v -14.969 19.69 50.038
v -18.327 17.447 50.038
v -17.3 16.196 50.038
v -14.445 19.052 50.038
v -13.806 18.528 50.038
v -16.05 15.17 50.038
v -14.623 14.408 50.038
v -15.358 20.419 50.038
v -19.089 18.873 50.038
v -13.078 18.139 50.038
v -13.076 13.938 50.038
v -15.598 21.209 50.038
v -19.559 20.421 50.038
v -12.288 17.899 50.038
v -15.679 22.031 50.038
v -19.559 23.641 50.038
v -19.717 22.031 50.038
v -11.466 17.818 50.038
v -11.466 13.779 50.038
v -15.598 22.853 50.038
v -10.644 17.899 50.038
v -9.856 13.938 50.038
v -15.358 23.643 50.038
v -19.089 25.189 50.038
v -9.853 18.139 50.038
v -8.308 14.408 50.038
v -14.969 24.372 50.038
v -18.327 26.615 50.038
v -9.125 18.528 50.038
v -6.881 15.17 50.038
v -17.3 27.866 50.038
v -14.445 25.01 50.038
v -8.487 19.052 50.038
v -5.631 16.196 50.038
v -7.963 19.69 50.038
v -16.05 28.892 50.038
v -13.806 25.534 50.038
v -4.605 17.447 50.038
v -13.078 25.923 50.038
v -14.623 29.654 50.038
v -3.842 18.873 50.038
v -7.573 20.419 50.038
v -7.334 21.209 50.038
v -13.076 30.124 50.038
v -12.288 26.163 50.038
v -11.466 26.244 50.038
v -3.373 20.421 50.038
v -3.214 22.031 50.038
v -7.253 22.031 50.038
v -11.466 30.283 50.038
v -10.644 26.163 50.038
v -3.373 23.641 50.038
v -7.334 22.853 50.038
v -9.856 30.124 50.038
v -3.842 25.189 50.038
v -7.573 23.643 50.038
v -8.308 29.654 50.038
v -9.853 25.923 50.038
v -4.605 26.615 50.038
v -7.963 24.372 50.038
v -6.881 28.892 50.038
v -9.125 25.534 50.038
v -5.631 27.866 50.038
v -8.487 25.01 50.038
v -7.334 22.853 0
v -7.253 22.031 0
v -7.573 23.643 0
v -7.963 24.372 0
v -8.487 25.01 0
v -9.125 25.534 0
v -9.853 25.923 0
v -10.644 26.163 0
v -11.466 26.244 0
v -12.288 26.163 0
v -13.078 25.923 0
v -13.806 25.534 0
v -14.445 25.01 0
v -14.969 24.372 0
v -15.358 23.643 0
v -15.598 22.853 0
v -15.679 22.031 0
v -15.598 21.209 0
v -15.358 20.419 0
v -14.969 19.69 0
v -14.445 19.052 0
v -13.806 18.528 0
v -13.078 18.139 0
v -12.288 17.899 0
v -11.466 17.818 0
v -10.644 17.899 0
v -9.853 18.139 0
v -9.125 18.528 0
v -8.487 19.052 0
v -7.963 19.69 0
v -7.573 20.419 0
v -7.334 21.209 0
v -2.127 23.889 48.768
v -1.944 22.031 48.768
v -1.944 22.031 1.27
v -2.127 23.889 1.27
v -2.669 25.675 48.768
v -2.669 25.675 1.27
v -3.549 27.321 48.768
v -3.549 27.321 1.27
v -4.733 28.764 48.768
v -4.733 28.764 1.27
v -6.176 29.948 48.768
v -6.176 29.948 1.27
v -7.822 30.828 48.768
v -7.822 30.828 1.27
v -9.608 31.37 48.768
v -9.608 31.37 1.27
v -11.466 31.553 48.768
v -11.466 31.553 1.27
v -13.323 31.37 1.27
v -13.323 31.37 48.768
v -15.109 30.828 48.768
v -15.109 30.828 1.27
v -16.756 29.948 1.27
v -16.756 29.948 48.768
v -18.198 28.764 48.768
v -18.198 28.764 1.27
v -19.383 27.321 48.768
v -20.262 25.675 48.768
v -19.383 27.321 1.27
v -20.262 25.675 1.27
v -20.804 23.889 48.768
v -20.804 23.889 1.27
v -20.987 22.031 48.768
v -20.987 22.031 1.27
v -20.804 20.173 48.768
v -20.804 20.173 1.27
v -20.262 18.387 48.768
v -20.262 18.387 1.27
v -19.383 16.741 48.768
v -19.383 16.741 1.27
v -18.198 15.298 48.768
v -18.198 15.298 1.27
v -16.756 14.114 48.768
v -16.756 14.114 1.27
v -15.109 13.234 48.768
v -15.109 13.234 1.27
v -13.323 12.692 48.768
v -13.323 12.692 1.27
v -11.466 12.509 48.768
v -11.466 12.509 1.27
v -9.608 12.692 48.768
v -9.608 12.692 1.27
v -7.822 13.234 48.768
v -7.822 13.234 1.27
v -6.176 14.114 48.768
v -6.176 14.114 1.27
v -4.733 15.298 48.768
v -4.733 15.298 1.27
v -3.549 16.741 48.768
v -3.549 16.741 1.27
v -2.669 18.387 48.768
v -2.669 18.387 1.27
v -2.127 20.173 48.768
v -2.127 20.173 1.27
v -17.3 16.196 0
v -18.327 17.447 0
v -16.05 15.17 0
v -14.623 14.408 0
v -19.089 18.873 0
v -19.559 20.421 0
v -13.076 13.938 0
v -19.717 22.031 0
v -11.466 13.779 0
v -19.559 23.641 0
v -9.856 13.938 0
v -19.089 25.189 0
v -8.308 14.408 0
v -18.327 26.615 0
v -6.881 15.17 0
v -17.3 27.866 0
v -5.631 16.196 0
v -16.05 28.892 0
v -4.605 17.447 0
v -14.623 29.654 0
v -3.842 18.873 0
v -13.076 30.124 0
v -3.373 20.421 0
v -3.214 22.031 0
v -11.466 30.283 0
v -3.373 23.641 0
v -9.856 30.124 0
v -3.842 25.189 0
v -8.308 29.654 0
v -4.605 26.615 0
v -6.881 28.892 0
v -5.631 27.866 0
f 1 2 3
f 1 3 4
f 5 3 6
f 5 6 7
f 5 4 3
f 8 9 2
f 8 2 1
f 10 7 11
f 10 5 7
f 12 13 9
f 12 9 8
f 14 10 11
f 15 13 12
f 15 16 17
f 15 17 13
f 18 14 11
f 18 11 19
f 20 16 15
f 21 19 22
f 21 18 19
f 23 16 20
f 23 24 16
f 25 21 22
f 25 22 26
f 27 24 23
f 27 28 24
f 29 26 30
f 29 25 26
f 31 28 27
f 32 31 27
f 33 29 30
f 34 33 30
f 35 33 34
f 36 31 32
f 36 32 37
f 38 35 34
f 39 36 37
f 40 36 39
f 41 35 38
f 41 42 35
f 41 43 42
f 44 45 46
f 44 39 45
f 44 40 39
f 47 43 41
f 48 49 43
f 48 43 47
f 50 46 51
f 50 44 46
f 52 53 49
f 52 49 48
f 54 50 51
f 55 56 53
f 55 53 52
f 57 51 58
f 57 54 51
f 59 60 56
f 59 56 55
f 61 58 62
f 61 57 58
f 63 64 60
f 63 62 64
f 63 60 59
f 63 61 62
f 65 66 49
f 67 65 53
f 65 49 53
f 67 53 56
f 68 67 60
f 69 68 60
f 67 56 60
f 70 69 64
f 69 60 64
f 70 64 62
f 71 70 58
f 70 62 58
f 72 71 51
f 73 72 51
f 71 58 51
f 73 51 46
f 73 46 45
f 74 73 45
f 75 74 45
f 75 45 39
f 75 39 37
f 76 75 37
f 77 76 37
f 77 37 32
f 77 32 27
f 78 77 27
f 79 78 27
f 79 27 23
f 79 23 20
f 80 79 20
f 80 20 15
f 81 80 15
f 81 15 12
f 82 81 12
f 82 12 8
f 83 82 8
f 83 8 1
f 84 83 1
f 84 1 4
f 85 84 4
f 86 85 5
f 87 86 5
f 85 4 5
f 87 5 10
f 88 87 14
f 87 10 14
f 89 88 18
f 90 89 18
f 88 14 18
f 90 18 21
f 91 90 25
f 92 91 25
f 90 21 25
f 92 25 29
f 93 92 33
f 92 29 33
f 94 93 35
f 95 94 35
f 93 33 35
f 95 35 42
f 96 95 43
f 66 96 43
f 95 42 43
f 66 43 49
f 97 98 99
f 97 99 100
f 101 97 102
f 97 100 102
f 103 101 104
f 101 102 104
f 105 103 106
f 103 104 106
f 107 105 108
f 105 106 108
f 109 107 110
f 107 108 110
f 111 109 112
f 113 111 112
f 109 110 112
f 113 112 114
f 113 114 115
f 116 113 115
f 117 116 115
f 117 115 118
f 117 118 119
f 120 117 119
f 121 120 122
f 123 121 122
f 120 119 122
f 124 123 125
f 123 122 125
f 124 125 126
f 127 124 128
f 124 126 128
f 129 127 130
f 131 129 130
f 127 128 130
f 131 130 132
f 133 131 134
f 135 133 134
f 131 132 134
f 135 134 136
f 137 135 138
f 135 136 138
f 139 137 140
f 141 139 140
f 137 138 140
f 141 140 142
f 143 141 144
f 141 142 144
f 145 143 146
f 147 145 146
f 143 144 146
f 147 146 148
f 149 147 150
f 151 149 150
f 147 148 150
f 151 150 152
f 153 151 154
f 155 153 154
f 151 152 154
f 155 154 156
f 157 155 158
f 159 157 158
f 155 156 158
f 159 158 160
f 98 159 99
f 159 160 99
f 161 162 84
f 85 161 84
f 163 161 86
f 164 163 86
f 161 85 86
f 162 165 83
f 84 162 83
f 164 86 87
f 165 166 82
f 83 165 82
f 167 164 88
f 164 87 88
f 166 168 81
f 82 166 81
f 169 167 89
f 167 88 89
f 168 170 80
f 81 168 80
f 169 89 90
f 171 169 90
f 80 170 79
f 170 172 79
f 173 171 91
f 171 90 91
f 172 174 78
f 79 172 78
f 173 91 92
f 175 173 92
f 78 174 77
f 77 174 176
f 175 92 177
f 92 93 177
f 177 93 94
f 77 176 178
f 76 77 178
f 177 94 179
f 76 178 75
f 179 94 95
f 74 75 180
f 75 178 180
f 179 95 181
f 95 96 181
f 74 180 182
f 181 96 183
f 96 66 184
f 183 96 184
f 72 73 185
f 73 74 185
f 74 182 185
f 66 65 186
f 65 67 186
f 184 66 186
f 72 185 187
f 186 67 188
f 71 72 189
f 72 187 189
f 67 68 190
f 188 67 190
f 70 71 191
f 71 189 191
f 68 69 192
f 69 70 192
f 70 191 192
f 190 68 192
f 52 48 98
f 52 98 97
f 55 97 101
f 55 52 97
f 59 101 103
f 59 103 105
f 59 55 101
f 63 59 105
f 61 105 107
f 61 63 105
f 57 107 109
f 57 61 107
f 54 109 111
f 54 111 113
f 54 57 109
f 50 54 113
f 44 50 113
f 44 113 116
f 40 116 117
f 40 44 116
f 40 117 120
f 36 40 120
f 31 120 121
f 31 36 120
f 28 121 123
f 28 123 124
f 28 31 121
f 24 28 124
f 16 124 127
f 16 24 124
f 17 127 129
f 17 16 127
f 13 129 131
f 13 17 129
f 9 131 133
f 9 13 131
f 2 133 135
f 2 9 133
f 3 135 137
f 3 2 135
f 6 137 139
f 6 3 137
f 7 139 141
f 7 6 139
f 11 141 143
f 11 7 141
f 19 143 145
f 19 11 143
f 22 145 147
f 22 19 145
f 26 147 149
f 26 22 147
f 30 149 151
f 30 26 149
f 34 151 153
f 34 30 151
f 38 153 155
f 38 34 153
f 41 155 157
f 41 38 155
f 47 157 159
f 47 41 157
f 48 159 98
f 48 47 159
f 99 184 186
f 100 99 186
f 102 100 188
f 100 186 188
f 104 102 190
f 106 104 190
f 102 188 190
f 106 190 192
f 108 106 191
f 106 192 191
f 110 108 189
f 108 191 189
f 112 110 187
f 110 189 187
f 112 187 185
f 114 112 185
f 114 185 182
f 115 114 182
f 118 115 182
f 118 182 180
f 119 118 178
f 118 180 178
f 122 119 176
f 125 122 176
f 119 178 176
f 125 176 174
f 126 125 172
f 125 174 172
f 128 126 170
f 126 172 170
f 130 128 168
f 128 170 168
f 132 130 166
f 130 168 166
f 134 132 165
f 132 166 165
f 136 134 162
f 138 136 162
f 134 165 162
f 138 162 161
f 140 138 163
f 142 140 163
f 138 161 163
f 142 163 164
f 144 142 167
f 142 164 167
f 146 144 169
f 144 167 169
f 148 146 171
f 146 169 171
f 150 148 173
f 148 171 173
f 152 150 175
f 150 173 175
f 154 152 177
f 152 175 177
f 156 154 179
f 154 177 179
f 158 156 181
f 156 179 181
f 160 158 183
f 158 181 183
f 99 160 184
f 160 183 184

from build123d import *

# Parameters (mm, degrees)
F0_R     = 9.521529
F1_DEPTH = 50.038
F2_R     = 4.212997
F3_DEPTH = 76.2
F4_SIZE  = 1.27


with BuildPart() as f1:
    # F0 (on Top) → F1 (new body)
    with BuildSketch(Plane.XY):
        with Locations((-11.465707, 22.031024)):
            Circle(F0_R)
    extrude(amount=F1_DEPTH)

    # F2 (on face) → F3 (cut)
    with BuildSketch(Plane.XY.offset(50.038)):
        with Locations((-11.465707, 22.031024)):
            Circle(F2_R)
    extrude(amount=-F3_DEPTH, mode=Mode.SUBTRACT)

    # F4
    f4_edges = [f1.edges().sort_by_distance(p)[0] for p in [
        (-20.987236, 22.031024, 0),
        (-20.987236, 22.031024, 50.038),
    ]]
    chamfer(f4_edges, length=F4_SIZE)


solid = f1.part
